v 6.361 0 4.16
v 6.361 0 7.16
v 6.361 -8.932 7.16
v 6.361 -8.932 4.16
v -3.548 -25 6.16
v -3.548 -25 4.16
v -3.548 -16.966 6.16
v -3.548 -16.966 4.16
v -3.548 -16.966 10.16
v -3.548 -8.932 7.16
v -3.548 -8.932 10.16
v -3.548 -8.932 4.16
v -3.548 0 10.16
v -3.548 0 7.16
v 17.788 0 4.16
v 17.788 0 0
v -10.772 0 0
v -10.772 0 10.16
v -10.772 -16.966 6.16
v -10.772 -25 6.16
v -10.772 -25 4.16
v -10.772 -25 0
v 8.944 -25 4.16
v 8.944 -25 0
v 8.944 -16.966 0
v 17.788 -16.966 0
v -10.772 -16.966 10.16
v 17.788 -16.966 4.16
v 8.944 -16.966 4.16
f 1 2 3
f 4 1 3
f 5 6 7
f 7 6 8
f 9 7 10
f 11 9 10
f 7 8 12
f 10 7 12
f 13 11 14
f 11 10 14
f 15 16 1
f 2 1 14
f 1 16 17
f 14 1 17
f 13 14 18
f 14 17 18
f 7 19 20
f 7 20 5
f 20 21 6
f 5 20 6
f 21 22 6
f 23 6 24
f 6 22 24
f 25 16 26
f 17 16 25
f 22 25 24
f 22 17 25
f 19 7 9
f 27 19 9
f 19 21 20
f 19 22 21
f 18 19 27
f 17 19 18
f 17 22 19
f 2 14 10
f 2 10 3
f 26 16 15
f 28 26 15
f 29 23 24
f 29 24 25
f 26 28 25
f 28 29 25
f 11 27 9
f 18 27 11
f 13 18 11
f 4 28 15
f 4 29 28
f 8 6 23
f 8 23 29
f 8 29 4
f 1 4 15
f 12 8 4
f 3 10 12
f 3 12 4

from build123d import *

# Parameters (mm, degrees)
F0_W      = 22.86
F0_H      = 10.16
F1_DEPTH  = 25
F2_W      = 7.1686236836
F2_H      = 5.1849592477
F3_DEPTH  = 5
F4_W      = 9.9097841885
F4_H      = 8.9319869876
F5_DEPTH  = 3
F6_W      = 10.2559335064
F6_H      = 16.0680130124
F7_DEPTH  = 6
F8_W      = 3.1437913674
F8_H      = 8.0340065062
F9_DEPTH  = 25
F10_W     = 8.0340065062
F10_H     = 6
F11_DEPTH = 7.2244124593
F12_W     = 7.2234124593
F12_H     = 8.0340065062
F13_DEPTH = 2
F14_DEPTH = 5.7


# Not quite as in the source:
# - a feature names something its author has since deleted; it is built from what else it names


with BuildPart() as f1:
    # F0 (on Front) → F1 (new body)
    with BuildSketch(Plane.XZ):
        with Locations((0.6582729786, 5.08)):
            Rectangle(F0_W, F0_H)
    extrude(amount=F1_DEPTH)

    # F2 (on face) → F3 (cut)
    with BuildSketch(Plane.XY.offset(10.16)):
        with Locations((-7.1874151796, -22.4075203761)):
            Rectangle(F2_W, F2_H)
    extrude(amount=-F3_DEPTH, mode=Mode.SUBTRACT)

    # F4 (on face) → F5 (cut)
    with BuildSketch(Plane.XY.offset(10.16)):
        with Locations((1.4065775322, -4.4659934938)):
            Rectangle(F4_W, F4_H)
    extrude(amount=-F5_DEPTH, mode=Mode.SUBTRACT)

    # F6 (on face) → F7 (cut)
    with BuildSketch(Plane.XY.offset(10.16)):
        with Locations((1.5796521911, -16.9659934938)):
            Rectangle(F6_W, F6_H)
        Polygon((6.3614696264, 0), (6.3614696264, -8.9319869876), (6.7076189443, -8.9319869876), (6.7076189443, -25), (12.0882729786, -25), (12.0882729786, 0), align=None)
    extrude(amount=-F7_DEPTH, mode=Mode.SUBTRACT)

    # F8 (on face) → F9 (cut)
    with BuildSketch(Plane.XY.offset(4.16)):
        with Locations((10.5163772949, -20.9829967469)):
            Rectangle(F8_W, F8_H)
    extrude(amount=-F9_DEPTH, mode=Mode.SUBTRACT)

    # F10 (on face) → F11 (cut, through all)
    with BuildSketch(Plane.YZ.offset(-3.5483145621)):
        with Locations((-20.9829967469, 7.16)):
            Rectangle(F10_W, F10_H)
    extrude(amount=-F11_DEPTH, mode=Mode.SUBTRACT)

    # F12 (on face) → F13 (join)
    with BuildSketch(Plane.XY.offset(4.16)):
        with Locations((-7.1600207917, -20.9829967469)):
            Rectangle(F12_W, F12_H)
    extrude(amount=F13_DEPTH)

    # F14 (add): a face of the model
    f14_faces = [f1.faces().sort_by_distance(p)[0] for p in [
        (12.0882729786, -8.4829967469, 2.08),
    ]]
    extrude(f14_faces, amount=F14_DEPTH)


solid = f1.part
